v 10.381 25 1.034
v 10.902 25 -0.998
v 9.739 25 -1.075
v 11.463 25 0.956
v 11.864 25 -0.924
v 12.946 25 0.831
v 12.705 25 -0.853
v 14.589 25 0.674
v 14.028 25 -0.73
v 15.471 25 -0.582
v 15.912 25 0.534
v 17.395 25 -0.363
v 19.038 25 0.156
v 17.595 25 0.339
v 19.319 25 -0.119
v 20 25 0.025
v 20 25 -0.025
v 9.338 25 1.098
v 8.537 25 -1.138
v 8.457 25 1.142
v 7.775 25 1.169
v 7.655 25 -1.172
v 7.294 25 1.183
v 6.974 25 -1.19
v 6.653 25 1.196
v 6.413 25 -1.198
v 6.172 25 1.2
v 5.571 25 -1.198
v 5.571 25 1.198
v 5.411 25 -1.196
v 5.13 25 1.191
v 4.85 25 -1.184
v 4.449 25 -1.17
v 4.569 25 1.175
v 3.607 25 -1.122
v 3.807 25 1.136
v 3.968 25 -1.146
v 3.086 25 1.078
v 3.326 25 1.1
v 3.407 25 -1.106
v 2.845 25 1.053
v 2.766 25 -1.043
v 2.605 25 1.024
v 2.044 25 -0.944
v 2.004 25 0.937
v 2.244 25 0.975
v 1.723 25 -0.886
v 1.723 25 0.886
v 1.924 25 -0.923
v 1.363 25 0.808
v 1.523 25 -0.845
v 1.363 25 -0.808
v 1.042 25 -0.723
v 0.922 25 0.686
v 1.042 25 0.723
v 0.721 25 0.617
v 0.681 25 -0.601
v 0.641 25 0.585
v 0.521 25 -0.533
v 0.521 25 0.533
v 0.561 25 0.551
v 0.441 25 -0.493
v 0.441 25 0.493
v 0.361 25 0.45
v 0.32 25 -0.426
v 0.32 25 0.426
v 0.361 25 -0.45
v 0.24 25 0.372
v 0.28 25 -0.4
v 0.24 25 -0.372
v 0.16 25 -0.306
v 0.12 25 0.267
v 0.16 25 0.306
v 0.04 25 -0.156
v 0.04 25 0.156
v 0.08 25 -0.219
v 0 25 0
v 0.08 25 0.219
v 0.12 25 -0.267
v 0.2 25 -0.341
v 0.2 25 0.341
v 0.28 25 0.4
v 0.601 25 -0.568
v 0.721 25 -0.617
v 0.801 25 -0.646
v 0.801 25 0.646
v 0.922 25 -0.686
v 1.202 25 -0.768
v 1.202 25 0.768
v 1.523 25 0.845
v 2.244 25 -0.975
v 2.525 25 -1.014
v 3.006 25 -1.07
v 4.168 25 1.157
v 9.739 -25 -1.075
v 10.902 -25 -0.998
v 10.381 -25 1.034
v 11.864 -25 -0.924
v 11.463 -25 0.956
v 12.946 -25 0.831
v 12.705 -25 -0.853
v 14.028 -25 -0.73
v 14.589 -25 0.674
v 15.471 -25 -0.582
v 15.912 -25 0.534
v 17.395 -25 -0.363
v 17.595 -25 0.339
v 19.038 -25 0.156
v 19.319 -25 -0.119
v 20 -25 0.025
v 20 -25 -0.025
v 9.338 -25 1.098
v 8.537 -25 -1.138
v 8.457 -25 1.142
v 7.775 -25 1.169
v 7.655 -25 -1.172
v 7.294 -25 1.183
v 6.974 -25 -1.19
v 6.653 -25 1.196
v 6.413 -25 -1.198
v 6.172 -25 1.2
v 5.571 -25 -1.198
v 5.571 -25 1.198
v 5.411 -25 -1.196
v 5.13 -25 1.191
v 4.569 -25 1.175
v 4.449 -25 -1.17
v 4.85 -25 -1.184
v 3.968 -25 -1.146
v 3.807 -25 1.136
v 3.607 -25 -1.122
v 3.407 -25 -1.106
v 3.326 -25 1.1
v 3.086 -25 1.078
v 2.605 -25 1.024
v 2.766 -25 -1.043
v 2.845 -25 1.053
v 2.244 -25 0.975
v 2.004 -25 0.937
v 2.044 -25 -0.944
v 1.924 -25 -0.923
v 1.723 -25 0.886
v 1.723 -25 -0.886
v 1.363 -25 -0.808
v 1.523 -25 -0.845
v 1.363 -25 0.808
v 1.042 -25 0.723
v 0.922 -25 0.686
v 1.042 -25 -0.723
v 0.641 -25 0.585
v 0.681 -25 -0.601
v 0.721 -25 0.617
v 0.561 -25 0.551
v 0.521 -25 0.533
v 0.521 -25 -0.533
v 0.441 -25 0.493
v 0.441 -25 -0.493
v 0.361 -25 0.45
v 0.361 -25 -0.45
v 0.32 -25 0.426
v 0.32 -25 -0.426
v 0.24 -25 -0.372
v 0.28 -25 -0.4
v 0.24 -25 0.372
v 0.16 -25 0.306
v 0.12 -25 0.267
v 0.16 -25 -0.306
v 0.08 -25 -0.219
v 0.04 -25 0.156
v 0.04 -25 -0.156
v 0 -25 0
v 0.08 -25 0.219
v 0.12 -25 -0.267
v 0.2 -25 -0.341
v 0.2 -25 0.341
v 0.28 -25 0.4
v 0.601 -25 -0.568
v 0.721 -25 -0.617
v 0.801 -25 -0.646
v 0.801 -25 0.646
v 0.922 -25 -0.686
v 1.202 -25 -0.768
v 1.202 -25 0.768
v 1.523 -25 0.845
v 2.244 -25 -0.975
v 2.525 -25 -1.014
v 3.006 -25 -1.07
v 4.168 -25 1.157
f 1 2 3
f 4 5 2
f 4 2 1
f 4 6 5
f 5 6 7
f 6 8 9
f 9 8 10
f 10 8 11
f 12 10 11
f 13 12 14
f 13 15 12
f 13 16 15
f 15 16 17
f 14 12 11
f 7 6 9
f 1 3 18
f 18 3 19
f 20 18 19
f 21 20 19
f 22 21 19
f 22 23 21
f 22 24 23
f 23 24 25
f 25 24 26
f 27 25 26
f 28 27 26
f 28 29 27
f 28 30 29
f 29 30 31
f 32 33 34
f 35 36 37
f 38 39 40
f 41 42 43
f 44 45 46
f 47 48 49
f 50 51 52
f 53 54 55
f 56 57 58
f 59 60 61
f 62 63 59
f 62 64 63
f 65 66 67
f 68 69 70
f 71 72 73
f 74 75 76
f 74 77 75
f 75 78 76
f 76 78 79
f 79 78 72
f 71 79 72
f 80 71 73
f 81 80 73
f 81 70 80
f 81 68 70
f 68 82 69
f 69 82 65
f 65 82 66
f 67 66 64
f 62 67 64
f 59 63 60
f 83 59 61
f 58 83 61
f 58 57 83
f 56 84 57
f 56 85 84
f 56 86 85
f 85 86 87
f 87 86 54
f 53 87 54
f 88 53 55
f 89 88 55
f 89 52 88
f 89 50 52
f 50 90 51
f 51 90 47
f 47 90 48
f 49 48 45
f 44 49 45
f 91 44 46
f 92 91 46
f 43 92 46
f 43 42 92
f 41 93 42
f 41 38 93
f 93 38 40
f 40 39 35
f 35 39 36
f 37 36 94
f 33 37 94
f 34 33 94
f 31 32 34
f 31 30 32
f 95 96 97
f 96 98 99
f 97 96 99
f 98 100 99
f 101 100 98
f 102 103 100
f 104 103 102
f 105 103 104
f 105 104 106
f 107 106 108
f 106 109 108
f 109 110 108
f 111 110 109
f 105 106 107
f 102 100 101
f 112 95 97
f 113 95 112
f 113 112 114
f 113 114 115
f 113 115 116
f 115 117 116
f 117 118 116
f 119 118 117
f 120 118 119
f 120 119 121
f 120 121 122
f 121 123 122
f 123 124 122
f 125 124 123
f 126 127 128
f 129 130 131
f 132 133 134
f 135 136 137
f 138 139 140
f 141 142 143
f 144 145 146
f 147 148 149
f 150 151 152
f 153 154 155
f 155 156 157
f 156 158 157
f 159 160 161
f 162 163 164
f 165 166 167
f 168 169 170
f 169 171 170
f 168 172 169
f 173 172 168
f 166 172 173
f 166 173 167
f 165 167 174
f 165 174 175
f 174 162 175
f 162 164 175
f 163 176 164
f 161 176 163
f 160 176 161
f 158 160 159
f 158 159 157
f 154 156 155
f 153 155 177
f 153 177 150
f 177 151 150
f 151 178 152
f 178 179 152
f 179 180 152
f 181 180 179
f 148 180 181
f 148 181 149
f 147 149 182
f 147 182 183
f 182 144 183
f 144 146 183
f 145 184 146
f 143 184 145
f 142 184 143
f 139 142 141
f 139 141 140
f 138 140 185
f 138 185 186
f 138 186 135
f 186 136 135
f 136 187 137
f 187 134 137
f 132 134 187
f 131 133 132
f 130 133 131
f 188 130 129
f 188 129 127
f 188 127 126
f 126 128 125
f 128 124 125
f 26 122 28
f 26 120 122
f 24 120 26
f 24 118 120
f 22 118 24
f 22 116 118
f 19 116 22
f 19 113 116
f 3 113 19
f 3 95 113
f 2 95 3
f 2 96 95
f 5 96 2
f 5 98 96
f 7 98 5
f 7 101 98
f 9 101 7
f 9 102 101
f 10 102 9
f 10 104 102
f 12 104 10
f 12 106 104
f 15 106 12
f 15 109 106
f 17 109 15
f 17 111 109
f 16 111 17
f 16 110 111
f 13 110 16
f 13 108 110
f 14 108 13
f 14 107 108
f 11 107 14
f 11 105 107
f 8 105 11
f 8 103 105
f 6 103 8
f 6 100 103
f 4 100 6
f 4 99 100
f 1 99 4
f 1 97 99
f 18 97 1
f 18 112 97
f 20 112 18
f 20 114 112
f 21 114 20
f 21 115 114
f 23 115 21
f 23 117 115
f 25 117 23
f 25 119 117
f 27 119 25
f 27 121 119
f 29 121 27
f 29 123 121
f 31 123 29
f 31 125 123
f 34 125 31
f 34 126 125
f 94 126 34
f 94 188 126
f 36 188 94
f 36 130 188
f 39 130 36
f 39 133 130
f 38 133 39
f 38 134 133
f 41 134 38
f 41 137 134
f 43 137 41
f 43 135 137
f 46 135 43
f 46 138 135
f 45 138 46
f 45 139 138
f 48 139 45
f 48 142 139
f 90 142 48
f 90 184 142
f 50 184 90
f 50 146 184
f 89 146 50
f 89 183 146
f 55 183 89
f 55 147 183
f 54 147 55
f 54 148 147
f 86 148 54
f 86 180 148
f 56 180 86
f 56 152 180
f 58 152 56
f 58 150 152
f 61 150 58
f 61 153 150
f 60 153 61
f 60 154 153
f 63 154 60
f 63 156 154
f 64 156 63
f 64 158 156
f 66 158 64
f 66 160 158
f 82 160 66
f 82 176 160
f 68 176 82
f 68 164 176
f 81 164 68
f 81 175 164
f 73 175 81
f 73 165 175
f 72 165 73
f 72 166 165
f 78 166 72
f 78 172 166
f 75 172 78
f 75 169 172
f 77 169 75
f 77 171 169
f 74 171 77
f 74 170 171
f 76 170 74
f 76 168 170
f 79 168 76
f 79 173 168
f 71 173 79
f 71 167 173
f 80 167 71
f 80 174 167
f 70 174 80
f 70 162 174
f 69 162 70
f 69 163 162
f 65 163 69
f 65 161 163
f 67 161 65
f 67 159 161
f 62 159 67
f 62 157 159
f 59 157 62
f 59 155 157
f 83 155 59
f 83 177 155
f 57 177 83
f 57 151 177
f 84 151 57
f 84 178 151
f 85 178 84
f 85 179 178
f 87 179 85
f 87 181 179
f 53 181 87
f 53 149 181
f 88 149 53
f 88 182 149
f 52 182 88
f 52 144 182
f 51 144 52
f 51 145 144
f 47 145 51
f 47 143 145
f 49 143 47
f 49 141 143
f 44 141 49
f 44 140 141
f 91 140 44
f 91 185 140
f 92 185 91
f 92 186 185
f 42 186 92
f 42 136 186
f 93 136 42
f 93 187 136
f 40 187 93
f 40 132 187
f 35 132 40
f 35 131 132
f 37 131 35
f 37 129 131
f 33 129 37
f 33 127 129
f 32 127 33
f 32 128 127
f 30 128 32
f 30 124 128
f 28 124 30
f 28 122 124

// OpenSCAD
function naca_half_thickness(x,t) = 5*t*(0.2969*sqrt(x) - 0.1260*x - 0.3516*pow(x,2) + 0.2843*pow(x,3) - 0.1015*pow(x,4));
function naca_top_coordinates(t,n) = [ for (x=[0:1/(n-1):1]) [x, naca_half_thickness(x,t)]];
function naca_bottom_coordinates(t,n) = [ for (x=[1:-1/(n-1):0]) [x, - naca_half_thickness(x,t)]];
function naca_coordinates(t,n) = concat(naca_top_coordinates(t,n), naca_bottom_coordinates(t,n));
module naca_airfoil(chord,t,n) {
    points = naca_coordinates(t,n);
    scale([chord,chord,1])polygon(points);
}
module naca_wing(span,chord,t,n,center=false) {
    linear_extrude(height=span,center=center) {
        naca_airfoil(chord,t,n);
    }
}

rotate([90,0,0])
    naca_wing(span=50,chord=20,t=0.12,n=500,center=true);
